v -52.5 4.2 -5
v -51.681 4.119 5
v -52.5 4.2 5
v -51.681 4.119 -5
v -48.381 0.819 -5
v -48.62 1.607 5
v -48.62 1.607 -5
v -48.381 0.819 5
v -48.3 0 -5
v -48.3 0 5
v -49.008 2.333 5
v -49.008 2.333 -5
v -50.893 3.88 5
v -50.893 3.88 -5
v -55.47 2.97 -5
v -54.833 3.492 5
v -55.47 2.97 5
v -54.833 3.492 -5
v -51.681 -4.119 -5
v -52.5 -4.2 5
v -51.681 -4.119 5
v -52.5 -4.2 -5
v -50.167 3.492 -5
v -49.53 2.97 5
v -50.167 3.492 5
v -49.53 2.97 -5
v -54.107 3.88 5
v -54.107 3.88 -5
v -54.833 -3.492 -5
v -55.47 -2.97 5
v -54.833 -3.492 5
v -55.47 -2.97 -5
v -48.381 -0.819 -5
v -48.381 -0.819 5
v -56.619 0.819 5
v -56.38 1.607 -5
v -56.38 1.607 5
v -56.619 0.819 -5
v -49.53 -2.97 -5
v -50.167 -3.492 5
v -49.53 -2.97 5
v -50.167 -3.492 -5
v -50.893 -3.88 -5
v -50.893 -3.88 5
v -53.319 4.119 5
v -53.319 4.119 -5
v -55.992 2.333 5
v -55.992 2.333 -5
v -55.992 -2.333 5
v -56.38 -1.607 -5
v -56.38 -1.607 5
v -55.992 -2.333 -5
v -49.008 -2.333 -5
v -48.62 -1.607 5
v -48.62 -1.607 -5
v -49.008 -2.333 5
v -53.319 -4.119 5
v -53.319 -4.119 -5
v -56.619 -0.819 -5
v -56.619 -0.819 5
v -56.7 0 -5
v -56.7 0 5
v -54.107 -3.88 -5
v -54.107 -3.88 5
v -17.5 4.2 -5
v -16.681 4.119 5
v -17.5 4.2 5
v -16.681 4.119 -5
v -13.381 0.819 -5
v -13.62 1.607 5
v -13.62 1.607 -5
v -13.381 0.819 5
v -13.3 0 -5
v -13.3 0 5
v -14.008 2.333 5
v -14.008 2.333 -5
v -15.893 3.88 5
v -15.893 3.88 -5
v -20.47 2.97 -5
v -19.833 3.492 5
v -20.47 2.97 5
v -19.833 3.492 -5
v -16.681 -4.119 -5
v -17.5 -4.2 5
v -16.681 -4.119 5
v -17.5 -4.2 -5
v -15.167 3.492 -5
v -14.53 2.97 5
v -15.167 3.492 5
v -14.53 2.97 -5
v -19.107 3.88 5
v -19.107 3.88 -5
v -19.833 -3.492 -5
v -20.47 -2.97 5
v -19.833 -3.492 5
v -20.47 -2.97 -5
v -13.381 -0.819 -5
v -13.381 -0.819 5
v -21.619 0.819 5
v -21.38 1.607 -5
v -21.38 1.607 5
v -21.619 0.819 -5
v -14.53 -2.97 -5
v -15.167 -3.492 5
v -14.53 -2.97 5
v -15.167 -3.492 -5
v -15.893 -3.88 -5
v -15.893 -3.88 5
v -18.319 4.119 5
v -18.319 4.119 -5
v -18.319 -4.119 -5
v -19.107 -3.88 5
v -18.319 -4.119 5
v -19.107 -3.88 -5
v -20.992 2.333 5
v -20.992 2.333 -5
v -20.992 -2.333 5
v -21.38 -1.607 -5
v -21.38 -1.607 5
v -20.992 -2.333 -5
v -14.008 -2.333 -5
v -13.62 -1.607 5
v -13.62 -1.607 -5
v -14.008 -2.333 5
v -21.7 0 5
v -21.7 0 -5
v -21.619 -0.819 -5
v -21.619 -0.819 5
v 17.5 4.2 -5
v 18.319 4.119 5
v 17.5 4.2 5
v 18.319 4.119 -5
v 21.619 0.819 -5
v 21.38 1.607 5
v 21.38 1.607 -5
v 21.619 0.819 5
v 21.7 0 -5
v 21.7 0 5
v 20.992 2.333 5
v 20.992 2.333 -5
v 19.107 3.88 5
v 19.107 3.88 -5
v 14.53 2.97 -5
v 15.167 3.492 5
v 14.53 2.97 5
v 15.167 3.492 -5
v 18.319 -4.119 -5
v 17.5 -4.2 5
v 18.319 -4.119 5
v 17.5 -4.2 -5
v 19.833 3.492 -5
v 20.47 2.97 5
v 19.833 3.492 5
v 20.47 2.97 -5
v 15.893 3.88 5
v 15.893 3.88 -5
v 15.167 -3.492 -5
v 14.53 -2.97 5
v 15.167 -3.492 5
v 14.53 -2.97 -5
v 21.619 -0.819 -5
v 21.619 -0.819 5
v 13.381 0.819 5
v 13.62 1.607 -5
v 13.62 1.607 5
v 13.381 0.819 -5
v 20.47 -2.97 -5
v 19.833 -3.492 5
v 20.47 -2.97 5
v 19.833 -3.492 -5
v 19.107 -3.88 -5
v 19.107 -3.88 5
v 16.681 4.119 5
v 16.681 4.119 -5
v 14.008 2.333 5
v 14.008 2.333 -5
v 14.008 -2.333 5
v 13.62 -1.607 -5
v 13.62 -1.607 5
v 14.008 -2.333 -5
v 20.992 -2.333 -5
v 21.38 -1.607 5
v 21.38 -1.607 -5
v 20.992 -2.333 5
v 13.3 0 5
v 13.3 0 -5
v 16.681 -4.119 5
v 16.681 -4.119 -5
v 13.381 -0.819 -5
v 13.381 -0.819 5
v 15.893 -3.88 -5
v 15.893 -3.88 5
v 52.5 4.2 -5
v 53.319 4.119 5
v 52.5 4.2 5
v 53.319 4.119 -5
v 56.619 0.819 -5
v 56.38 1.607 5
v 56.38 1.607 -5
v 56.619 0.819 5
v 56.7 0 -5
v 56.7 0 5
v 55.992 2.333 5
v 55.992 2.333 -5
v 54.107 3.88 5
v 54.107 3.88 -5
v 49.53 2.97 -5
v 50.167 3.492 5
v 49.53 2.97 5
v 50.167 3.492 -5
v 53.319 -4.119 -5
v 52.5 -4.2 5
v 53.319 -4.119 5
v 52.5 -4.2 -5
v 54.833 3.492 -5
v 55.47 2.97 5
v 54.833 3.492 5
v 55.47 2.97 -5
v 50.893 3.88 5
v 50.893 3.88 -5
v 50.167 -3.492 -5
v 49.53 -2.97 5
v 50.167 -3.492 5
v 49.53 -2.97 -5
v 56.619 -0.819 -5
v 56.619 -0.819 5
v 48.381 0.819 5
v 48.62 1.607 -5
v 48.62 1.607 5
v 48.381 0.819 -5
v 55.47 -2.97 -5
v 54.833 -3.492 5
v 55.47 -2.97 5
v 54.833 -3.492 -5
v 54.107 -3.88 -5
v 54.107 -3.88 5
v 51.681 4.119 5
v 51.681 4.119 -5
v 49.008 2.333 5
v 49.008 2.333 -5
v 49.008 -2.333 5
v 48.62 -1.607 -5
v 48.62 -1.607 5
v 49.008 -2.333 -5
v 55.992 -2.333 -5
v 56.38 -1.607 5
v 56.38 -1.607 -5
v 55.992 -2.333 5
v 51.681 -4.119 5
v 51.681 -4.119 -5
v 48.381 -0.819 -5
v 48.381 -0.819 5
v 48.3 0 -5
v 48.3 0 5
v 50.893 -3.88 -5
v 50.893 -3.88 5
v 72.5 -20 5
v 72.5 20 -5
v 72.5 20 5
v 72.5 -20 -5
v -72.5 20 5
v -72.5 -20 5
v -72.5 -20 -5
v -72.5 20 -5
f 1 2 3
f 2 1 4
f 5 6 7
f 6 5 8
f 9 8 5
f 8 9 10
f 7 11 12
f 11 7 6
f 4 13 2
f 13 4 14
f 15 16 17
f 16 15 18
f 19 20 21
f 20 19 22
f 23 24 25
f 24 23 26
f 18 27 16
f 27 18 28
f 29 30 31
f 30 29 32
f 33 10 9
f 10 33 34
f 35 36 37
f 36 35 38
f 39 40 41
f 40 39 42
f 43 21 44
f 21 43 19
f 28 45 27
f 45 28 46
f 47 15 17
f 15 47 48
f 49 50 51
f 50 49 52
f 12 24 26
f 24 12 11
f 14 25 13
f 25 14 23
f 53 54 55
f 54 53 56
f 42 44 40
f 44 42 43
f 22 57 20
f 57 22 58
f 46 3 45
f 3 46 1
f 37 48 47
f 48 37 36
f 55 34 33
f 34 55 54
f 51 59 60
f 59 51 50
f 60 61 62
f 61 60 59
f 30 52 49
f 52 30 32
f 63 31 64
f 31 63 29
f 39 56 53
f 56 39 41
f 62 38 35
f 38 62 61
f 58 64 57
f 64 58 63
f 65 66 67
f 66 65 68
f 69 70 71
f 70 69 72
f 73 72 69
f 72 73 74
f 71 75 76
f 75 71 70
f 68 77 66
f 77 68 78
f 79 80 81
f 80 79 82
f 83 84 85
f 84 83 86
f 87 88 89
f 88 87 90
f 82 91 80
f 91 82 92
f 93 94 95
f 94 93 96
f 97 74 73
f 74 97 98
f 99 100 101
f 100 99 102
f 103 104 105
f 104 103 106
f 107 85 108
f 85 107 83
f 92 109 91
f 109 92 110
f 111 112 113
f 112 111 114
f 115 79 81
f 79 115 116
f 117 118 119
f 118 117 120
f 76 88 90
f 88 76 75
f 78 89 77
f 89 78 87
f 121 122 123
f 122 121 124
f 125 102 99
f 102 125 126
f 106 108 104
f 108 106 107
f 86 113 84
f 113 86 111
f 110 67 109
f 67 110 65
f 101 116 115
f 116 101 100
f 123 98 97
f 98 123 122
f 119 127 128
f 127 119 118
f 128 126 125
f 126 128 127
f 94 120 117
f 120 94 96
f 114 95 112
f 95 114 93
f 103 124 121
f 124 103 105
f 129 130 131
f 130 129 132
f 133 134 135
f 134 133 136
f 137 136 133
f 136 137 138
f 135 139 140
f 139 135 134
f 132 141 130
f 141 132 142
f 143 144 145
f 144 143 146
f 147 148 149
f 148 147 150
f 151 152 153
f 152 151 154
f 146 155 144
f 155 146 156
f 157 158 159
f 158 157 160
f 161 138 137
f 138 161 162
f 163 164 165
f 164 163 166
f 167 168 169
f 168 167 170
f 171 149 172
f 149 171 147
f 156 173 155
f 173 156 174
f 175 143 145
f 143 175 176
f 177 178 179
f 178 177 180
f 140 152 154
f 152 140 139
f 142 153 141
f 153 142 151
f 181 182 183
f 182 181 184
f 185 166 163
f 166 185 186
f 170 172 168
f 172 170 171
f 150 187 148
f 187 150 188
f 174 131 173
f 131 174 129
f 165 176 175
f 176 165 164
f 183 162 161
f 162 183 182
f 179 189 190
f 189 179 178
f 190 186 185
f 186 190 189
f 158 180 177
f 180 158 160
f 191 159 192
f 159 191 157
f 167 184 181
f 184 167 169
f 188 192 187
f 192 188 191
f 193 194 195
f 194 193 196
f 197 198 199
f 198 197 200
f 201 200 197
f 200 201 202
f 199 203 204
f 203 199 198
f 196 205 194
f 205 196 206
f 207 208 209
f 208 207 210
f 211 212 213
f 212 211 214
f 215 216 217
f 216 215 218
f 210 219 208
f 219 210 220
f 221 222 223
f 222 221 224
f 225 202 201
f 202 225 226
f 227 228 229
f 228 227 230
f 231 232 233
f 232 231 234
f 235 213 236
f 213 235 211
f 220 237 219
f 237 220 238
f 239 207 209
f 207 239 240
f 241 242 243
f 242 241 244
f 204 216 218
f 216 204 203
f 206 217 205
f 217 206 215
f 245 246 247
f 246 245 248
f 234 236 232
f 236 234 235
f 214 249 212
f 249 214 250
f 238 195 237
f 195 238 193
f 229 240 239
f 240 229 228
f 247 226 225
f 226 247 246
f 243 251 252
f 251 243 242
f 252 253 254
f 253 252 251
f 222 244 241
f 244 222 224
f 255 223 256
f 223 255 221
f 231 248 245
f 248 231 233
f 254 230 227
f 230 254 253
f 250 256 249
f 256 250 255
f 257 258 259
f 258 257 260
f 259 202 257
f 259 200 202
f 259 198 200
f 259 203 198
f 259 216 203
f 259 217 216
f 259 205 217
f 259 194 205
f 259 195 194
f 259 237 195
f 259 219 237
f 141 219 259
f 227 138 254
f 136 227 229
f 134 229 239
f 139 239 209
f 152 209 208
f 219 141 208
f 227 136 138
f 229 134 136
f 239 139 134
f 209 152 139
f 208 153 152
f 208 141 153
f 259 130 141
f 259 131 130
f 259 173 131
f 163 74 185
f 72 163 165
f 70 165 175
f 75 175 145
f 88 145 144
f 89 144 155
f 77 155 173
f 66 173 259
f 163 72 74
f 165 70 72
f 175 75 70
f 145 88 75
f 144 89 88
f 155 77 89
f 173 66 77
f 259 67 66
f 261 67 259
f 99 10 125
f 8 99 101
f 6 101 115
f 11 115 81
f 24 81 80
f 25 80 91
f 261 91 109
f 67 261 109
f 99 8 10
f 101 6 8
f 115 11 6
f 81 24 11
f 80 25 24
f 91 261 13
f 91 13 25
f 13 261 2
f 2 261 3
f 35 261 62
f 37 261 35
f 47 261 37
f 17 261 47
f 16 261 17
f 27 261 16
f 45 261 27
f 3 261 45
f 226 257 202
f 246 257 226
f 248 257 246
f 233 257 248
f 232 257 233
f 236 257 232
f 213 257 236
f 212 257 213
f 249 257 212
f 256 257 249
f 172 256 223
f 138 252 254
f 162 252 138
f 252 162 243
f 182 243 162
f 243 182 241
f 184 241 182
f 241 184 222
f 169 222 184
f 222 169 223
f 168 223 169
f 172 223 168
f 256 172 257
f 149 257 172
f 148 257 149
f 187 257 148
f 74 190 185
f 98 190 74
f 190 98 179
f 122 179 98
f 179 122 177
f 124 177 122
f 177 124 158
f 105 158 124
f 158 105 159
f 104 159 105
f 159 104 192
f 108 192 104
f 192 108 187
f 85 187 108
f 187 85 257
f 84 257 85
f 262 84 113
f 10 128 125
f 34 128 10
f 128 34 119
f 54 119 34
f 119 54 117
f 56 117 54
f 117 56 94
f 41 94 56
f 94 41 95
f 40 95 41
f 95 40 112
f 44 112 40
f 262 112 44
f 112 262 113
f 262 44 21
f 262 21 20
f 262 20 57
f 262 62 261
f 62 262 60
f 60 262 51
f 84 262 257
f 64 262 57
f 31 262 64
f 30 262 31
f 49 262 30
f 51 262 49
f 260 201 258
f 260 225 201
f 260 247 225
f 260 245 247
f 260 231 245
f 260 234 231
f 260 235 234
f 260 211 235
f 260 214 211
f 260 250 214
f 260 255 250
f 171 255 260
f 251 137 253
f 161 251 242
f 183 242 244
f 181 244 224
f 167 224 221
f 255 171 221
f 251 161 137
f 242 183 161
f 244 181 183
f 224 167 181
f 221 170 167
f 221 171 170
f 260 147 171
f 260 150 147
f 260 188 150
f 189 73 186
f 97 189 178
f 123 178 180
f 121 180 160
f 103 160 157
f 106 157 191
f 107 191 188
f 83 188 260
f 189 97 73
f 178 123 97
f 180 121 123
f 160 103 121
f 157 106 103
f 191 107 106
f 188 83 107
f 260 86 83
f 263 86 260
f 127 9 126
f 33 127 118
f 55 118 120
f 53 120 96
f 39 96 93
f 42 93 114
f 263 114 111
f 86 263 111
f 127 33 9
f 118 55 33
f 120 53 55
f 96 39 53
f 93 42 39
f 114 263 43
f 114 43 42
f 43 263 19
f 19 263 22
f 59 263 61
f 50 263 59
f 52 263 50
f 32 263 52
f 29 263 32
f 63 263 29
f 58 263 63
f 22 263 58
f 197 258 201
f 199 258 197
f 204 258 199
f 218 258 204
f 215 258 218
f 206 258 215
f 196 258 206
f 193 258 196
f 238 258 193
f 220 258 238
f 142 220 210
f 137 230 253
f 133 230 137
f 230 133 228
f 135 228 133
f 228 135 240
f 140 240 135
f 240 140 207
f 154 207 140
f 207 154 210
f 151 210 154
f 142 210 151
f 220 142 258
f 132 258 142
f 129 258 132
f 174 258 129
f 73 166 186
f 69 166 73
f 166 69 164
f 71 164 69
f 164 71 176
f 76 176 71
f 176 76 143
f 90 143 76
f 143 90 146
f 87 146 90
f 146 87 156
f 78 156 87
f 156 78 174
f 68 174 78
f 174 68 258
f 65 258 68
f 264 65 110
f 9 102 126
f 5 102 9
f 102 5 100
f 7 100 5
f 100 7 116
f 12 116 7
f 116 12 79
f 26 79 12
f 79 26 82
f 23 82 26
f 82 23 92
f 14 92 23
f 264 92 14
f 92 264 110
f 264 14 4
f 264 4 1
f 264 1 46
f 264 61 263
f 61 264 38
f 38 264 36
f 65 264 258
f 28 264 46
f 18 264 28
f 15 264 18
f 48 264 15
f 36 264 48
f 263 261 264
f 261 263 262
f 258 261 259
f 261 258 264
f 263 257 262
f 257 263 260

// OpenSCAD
$fn = 32;

// ----------------------------------------------------------------------
// Hole bar, 4 x Ø8.4
// skip layout, 20 mm edge offset
// ----------------------------------------------------------------------

// --- parameters (mm) ---
bar_w = 40;         // bar width (Y)
bar_t = 10;         // bar thickness (Z)
holes = 4;          // holes per row
hole_d = 8.4;       // hole diameter
edge = 20;          // offset from the bar end to the first hole
grid_pitch = 17.5;  // grid the bar was laid out on

// --- derived feature positions (mm) ---
pitch = grid_pitch * 2;       // = 35   holes sit every other grid slot
span = (holes - 1) * pitch;   // = 105   distance between the end holes
bar_l = span + 2 * edge;      // = 145   overall bar length
start_x = -bar_l / 2 + edge;  // = -52.5   X of the first hole
feature_centers = [
  [start_x + 0 * pitch, 0],
  [start_x + 1 * pitch, 0],
  [start_x + 2 * pitch, 0],
  [start_x + 3 * pitch, 0]
];   // hole centres of the first row

// bar with one row of holes, drilled from feature_centers
difference() {
  translate([-bar_l / 2, -bar_w / 2, -bar_t / 2]) cube([bar_l, bar_w, bar_t]);
  for (centre = feature_centers)
    translate([centre[0], centre[1], 0])
      cylinder(d = hole_d, h = bar_t + 2, center = true);
}
